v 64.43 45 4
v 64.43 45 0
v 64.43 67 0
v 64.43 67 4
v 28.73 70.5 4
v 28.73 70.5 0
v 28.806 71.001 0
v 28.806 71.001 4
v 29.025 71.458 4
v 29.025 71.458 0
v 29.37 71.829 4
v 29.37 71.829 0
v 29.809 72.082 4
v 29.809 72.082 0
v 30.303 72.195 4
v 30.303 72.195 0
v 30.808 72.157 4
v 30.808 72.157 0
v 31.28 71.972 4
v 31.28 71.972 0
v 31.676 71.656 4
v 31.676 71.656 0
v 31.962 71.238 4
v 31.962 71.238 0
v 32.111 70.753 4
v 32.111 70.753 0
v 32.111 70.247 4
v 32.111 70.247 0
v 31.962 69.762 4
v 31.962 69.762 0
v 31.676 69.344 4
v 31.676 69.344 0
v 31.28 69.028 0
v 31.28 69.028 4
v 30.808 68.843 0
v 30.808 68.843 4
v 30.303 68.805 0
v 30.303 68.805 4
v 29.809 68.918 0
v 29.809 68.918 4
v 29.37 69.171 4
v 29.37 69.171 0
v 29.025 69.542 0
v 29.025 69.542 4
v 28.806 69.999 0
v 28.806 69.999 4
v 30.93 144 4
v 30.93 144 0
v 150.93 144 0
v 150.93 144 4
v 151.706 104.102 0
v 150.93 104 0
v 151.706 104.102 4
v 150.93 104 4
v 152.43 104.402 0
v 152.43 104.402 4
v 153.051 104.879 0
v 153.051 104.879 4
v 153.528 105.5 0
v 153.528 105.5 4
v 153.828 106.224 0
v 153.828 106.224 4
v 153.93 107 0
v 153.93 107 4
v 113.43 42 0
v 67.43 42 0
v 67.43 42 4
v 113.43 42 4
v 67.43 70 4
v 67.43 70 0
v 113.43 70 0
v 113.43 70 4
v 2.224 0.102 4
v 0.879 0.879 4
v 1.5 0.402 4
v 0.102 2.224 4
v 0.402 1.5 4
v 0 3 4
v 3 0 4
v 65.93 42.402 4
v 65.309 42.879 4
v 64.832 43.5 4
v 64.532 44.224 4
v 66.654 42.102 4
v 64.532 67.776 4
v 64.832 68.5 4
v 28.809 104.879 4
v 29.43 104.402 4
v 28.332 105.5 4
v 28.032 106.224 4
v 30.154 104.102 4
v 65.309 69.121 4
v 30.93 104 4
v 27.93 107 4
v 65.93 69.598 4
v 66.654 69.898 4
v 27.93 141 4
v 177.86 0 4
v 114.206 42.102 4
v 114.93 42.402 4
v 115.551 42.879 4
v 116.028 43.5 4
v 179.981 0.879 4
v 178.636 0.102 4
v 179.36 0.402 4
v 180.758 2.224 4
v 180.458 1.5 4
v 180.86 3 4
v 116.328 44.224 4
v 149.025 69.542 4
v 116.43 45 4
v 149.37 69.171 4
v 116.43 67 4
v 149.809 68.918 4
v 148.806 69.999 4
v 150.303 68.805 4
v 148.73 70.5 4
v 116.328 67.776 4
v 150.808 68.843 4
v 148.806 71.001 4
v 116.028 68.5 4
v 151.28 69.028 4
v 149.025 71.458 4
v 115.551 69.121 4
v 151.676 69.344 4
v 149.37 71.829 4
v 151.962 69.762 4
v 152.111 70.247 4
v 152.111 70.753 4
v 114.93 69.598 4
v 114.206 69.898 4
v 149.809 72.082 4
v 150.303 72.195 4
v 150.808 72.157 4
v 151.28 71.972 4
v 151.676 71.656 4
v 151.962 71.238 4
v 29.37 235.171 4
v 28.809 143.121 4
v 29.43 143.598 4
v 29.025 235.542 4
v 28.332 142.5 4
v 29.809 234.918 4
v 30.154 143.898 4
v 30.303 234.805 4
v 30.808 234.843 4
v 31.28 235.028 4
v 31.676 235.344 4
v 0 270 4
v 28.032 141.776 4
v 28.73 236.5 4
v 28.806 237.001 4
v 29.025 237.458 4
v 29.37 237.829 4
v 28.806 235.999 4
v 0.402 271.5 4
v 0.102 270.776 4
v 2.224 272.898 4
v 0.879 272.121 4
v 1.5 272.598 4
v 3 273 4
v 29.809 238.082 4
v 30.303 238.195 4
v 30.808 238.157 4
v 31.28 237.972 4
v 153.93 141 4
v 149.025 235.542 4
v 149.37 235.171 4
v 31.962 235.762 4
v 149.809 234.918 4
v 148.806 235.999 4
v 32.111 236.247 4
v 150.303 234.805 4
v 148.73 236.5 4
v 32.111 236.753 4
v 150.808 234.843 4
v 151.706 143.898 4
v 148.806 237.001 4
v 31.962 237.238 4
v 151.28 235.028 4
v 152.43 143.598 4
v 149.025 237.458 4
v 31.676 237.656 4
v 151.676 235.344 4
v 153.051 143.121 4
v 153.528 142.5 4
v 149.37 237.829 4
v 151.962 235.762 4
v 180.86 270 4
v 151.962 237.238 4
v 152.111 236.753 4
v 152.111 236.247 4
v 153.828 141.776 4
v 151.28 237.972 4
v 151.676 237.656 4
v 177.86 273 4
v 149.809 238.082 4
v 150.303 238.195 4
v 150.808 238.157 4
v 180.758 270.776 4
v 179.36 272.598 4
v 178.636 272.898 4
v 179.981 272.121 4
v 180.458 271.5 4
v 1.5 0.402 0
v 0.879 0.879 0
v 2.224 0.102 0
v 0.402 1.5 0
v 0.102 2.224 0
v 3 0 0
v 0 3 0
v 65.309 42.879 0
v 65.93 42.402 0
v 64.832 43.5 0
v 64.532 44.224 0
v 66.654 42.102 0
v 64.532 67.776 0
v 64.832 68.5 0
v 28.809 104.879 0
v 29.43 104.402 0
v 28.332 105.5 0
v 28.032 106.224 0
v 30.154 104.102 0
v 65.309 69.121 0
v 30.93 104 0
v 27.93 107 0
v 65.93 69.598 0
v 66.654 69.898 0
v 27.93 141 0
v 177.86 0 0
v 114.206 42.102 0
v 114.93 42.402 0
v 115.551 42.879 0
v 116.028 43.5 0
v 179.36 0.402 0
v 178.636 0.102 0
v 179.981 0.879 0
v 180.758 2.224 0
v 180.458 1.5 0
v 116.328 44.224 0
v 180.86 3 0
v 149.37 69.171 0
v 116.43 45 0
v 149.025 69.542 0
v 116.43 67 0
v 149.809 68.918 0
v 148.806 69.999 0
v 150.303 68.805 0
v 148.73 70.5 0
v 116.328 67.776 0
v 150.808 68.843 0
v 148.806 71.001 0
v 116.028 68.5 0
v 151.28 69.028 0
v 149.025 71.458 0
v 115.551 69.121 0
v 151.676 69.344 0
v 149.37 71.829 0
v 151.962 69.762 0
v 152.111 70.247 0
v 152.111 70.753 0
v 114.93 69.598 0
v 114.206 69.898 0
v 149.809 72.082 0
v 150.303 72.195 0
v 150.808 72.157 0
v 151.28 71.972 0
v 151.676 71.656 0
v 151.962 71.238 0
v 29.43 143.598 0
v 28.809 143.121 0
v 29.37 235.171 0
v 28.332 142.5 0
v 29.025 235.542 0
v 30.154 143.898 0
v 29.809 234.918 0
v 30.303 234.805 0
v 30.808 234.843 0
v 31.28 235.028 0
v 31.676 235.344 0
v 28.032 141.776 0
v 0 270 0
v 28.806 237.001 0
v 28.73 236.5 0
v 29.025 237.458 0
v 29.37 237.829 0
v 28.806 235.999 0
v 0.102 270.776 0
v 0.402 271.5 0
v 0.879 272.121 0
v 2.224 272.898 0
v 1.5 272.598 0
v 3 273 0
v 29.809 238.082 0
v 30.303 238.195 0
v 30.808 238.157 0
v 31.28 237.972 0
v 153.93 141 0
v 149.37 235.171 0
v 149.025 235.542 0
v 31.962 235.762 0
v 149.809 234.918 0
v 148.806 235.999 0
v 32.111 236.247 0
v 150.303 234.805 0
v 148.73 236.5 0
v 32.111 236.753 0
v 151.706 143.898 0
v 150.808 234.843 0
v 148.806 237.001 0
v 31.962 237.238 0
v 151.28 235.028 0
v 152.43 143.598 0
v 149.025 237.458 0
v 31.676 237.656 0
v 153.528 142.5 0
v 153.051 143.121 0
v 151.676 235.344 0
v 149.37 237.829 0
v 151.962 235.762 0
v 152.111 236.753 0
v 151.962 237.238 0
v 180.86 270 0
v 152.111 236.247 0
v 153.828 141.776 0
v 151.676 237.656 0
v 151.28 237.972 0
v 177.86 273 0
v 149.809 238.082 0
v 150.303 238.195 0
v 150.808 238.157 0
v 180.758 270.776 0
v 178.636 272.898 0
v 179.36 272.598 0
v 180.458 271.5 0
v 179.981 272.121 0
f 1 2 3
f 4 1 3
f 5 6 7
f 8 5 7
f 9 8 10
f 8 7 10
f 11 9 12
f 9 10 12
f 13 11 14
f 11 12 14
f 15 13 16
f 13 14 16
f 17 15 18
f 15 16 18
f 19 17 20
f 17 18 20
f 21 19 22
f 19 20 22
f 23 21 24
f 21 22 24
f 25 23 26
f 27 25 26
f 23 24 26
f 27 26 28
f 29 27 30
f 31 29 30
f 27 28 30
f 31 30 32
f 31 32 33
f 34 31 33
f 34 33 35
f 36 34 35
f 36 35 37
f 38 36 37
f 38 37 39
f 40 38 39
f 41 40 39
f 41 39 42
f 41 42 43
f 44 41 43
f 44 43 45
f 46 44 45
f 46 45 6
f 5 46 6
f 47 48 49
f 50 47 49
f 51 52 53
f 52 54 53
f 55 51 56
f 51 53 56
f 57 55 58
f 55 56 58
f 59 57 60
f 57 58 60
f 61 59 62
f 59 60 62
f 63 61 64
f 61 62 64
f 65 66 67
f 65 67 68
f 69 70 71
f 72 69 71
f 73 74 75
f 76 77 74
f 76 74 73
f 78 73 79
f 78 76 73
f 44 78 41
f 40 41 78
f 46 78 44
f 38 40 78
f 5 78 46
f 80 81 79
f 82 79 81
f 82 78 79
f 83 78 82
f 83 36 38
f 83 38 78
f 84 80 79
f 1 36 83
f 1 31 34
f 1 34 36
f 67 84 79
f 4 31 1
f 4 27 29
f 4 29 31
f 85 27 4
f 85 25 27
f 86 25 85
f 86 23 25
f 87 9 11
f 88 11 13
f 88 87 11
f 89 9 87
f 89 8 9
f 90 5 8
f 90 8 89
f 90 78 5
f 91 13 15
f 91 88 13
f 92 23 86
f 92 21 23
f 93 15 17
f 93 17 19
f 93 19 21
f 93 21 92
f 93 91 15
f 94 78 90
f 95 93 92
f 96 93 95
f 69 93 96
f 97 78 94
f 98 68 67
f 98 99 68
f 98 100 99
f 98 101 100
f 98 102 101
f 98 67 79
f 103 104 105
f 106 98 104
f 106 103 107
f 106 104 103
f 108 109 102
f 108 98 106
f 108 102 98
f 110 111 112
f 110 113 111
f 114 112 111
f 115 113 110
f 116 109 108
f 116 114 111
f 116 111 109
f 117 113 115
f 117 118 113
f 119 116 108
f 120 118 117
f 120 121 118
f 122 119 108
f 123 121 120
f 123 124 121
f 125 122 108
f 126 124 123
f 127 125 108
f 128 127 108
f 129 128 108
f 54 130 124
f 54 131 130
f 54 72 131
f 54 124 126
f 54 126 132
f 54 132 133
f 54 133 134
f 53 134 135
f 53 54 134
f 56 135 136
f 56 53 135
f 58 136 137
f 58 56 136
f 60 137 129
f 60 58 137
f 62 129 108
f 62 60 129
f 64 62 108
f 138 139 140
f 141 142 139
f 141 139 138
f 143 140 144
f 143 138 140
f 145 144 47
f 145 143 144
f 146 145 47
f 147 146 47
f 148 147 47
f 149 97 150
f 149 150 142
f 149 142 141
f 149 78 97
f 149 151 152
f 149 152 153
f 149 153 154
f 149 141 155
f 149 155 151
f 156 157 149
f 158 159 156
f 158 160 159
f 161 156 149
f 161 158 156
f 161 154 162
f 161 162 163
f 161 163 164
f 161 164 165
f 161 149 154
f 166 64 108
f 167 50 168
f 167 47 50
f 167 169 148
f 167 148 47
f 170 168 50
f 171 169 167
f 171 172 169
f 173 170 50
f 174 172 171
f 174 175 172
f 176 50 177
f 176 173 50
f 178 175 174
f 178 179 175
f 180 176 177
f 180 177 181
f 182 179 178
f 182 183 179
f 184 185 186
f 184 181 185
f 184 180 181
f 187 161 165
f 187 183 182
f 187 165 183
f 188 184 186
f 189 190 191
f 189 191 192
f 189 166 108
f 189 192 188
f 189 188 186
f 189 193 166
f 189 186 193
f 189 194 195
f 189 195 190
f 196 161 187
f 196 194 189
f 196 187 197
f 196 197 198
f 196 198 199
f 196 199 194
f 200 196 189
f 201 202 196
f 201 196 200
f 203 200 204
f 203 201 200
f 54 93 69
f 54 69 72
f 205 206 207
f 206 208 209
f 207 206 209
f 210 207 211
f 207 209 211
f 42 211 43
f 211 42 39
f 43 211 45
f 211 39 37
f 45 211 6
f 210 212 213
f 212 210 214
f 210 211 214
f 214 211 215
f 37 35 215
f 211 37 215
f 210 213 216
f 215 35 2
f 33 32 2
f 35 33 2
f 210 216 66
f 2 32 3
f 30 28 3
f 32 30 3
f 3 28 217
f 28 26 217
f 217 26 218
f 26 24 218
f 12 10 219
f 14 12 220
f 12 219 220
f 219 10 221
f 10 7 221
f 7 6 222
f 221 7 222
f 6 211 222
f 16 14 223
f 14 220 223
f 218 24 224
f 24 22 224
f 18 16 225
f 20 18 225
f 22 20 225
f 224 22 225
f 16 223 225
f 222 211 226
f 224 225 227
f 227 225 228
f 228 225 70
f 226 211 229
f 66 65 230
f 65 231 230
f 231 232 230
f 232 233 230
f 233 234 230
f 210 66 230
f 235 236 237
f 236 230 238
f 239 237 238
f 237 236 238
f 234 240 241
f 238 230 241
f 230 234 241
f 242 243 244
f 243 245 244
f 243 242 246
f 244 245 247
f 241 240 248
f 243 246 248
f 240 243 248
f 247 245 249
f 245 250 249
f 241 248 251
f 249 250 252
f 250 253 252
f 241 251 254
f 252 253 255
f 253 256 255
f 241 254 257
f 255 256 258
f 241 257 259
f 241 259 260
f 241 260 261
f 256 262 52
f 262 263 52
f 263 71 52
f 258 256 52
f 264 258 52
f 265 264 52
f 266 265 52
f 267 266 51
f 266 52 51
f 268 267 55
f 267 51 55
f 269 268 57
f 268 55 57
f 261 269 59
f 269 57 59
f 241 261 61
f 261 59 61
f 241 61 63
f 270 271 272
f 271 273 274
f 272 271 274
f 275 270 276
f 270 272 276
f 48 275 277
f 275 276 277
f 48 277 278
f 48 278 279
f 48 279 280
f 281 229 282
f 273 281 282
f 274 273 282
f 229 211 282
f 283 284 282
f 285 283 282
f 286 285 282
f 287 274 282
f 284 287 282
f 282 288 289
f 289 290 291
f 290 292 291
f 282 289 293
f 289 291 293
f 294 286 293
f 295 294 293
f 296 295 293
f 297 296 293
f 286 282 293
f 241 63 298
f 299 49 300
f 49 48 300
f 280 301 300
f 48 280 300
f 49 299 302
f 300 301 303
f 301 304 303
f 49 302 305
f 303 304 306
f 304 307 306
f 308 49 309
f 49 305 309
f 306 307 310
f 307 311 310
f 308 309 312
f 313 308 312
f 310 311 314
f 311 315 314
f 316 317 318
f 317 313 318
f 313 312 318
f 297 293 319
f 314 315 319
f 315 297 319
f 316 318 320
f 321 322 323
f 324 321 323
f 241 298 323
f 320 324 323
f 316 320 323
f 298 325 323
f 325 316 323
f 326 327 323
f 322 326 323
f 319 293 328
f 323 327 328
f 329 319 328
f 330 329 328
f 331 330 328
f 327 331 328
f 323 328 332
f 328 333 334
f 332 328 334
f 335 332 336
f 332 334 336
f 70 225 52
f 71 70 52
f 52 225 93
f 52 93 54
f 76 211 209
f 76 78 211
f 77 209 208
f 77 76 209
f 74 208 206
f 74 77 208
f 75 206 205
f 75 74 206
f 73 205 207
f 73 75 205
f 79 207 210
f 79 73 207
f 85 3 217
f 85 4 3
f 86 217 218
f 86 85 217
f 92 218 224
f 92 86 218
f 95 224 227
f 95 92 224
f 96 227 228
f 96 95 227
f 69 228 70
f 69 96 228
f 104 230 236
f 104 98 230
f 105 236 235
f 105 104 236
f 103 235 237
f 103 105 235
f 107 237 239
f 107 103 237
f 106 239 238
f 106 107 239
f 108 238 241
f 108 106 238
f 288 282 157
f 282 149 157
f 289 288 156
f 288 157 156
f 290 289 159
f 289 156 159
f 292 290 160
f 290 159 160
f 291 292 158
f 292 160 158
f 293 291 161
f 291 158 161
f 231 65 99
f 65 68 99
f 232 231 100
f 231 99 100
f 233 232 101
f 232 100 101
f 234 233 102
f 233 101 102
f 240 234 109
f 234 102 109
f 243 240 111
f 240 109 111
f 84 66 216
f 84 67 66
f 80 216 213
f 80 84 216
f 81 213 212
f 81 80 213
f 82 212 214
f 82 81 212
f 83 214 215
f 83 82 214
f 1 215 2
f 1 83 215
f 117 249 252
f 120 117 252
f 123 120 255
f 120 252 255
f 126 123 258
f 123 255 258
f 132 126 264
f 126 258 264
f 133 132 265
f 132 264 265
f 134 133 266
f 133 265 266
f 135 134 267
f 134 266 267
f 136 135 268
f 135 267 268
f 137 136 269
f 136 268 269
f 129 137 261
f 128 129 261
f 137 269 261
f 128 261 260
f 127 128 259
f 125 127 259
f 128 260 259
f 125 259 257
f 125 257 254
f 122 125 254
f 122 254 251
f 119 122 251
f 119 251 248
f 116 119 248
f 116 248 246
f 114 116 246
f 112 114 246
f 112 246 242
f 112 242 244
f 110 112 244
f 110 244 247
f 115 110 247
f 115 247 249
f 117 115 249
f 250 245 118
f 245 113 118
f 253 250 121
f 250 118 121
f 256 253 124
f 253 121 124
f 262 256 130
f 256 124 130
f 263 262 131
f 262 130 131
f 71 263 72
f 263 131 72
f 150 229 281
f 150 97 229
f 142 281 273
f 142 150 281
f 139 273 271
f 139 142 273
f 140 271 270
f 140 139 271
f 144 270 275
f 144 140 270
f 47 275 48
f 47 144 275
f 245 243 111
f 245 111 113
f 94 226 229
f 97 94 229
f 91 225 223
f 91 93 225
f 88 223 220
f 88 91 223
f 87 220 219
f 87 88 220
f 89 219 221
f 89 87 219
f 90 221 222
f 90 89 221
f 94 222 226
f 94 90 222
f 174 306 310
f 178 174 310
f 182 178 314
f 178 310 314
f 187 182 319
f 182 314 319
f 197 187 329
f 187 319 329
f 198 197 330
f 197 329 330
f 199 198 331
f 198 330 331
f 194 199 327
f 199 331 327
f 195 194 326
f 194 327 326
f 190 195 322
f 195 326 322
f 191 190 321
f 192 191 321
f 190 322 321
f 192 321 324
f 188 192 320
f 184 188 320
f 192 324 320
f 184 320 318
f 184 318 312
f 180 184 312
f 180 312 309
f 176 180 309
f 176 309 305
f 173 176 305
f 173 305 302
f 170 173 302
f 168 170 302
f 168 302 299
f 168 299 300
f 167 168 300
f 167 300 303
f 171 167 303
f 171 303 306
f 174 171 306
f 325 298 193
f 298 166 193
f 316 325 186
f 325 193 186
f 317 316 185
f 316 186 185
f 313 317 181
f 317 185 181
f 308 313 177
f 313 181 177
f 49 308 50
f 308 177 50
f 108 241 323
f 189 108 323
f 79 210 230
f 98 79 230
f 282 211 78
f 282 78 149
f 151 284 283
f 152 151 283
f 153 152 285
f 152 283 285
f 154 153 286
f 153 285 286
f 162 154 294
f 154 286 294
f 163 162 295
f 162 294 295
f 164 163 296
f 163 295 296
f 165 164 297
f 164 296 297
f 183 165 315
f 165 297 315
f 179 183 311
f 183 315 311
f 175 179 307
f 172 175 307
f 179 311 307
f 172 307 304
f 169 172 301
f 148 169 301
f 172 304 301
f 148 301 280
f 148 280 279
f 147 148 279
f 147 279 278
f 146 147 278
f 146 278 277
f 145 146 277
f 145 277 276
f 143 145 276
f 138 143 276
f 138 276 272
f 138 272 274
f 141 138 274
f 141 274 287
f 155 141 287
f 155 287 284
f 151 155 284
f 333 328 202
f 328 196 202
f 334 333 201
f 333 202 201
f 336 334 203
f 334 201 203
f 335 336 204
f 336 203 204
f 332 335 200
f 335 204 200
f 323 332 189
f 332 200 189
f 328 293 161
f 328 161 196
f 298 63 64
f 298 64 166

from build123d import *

# Parameters (mm, degrees)
ESQUISSE1_W        = 180.86
ESQUISSE1_H        = 273
ESQUISSE1_R        = 1.5
ESQUISSE1_W_2      = 52
ESQUISSE1_H_2      = 28
ESQUISSE1_W_3      = 126
ESQUISSE1_H_3      = 40
BOSS_EXTRU_1_DEPTH = 4
D_GAGEMENT_M31_D   = 3.4
CONG_1_R           = 3


with BuildPart() as part:
    # Esquisse1 → Boss.-Extru.1 (new body)
    with BuildSketch(Plane.XY):
        with Locations((90.43, 136.5)):
            Rectangle(ESQUISSE1_W, ESQUISSE1_H)
        with Locations((30.43, 236.5)):
            Circle(ESQUISSE1_R, mode=Mode.SUBTRACT)
        with Locations((150.43, 236.5)):
            Circle(ESQUISSE1_R, mode=Mode.SUBTRACT)
        with Locations((30.43, 70.5)):
            Circle(ESQUISSE1_R, mode=Mode.SUBTRACT)
        with Locations((150.43, 70.5)):
            Circle(ESQUISSE1_R, mode=Mode.SUBTRACT)
        with Locations((90.43, 56)):
            Rectangle(ESQUISSE1_W_2, ESQUISSE1_H_2, mode=Mode.SUBTRACT)
        with Locations((90.93, 124)):
            Rectangle(ESQUISSE1_W_3, ESQUISSE1_H_3, mode=Mode.SUBTRACT)
    extrude(amount=BOSS_EXTRU_1_DEPTH)

    # Dégagement M31 (through all)
    with Locations(Plane.XY.offset(4)):
        with Locations((30.43, 236.5), (150.43, 236.5), (150.43, 70.5), (30.43, 70.5)):
            Hole(D_GAGEMENT_M31_D / 2)

    # Congé1
    cong_1_edges = [part.edges().sort_by_distance(p)[0] for p in [
        (64.43, 70, 2),
        (64.43, 42, 2),
        (116.43, 42, 2),
        (116.43, 70, 2),
        (27.93, 144, 2),
        (27.93, 104, 2),
        (153.93, 104, 2),
        (153.93, 144, 2),
        (0, 273, 2),
        (180.86, 273, 2),
        (180.86, 0, 2),
        (0, 0, 2),
    ]]
    fillet(cong_1_edges, radius=CONG_1_R)


solid = part.part
